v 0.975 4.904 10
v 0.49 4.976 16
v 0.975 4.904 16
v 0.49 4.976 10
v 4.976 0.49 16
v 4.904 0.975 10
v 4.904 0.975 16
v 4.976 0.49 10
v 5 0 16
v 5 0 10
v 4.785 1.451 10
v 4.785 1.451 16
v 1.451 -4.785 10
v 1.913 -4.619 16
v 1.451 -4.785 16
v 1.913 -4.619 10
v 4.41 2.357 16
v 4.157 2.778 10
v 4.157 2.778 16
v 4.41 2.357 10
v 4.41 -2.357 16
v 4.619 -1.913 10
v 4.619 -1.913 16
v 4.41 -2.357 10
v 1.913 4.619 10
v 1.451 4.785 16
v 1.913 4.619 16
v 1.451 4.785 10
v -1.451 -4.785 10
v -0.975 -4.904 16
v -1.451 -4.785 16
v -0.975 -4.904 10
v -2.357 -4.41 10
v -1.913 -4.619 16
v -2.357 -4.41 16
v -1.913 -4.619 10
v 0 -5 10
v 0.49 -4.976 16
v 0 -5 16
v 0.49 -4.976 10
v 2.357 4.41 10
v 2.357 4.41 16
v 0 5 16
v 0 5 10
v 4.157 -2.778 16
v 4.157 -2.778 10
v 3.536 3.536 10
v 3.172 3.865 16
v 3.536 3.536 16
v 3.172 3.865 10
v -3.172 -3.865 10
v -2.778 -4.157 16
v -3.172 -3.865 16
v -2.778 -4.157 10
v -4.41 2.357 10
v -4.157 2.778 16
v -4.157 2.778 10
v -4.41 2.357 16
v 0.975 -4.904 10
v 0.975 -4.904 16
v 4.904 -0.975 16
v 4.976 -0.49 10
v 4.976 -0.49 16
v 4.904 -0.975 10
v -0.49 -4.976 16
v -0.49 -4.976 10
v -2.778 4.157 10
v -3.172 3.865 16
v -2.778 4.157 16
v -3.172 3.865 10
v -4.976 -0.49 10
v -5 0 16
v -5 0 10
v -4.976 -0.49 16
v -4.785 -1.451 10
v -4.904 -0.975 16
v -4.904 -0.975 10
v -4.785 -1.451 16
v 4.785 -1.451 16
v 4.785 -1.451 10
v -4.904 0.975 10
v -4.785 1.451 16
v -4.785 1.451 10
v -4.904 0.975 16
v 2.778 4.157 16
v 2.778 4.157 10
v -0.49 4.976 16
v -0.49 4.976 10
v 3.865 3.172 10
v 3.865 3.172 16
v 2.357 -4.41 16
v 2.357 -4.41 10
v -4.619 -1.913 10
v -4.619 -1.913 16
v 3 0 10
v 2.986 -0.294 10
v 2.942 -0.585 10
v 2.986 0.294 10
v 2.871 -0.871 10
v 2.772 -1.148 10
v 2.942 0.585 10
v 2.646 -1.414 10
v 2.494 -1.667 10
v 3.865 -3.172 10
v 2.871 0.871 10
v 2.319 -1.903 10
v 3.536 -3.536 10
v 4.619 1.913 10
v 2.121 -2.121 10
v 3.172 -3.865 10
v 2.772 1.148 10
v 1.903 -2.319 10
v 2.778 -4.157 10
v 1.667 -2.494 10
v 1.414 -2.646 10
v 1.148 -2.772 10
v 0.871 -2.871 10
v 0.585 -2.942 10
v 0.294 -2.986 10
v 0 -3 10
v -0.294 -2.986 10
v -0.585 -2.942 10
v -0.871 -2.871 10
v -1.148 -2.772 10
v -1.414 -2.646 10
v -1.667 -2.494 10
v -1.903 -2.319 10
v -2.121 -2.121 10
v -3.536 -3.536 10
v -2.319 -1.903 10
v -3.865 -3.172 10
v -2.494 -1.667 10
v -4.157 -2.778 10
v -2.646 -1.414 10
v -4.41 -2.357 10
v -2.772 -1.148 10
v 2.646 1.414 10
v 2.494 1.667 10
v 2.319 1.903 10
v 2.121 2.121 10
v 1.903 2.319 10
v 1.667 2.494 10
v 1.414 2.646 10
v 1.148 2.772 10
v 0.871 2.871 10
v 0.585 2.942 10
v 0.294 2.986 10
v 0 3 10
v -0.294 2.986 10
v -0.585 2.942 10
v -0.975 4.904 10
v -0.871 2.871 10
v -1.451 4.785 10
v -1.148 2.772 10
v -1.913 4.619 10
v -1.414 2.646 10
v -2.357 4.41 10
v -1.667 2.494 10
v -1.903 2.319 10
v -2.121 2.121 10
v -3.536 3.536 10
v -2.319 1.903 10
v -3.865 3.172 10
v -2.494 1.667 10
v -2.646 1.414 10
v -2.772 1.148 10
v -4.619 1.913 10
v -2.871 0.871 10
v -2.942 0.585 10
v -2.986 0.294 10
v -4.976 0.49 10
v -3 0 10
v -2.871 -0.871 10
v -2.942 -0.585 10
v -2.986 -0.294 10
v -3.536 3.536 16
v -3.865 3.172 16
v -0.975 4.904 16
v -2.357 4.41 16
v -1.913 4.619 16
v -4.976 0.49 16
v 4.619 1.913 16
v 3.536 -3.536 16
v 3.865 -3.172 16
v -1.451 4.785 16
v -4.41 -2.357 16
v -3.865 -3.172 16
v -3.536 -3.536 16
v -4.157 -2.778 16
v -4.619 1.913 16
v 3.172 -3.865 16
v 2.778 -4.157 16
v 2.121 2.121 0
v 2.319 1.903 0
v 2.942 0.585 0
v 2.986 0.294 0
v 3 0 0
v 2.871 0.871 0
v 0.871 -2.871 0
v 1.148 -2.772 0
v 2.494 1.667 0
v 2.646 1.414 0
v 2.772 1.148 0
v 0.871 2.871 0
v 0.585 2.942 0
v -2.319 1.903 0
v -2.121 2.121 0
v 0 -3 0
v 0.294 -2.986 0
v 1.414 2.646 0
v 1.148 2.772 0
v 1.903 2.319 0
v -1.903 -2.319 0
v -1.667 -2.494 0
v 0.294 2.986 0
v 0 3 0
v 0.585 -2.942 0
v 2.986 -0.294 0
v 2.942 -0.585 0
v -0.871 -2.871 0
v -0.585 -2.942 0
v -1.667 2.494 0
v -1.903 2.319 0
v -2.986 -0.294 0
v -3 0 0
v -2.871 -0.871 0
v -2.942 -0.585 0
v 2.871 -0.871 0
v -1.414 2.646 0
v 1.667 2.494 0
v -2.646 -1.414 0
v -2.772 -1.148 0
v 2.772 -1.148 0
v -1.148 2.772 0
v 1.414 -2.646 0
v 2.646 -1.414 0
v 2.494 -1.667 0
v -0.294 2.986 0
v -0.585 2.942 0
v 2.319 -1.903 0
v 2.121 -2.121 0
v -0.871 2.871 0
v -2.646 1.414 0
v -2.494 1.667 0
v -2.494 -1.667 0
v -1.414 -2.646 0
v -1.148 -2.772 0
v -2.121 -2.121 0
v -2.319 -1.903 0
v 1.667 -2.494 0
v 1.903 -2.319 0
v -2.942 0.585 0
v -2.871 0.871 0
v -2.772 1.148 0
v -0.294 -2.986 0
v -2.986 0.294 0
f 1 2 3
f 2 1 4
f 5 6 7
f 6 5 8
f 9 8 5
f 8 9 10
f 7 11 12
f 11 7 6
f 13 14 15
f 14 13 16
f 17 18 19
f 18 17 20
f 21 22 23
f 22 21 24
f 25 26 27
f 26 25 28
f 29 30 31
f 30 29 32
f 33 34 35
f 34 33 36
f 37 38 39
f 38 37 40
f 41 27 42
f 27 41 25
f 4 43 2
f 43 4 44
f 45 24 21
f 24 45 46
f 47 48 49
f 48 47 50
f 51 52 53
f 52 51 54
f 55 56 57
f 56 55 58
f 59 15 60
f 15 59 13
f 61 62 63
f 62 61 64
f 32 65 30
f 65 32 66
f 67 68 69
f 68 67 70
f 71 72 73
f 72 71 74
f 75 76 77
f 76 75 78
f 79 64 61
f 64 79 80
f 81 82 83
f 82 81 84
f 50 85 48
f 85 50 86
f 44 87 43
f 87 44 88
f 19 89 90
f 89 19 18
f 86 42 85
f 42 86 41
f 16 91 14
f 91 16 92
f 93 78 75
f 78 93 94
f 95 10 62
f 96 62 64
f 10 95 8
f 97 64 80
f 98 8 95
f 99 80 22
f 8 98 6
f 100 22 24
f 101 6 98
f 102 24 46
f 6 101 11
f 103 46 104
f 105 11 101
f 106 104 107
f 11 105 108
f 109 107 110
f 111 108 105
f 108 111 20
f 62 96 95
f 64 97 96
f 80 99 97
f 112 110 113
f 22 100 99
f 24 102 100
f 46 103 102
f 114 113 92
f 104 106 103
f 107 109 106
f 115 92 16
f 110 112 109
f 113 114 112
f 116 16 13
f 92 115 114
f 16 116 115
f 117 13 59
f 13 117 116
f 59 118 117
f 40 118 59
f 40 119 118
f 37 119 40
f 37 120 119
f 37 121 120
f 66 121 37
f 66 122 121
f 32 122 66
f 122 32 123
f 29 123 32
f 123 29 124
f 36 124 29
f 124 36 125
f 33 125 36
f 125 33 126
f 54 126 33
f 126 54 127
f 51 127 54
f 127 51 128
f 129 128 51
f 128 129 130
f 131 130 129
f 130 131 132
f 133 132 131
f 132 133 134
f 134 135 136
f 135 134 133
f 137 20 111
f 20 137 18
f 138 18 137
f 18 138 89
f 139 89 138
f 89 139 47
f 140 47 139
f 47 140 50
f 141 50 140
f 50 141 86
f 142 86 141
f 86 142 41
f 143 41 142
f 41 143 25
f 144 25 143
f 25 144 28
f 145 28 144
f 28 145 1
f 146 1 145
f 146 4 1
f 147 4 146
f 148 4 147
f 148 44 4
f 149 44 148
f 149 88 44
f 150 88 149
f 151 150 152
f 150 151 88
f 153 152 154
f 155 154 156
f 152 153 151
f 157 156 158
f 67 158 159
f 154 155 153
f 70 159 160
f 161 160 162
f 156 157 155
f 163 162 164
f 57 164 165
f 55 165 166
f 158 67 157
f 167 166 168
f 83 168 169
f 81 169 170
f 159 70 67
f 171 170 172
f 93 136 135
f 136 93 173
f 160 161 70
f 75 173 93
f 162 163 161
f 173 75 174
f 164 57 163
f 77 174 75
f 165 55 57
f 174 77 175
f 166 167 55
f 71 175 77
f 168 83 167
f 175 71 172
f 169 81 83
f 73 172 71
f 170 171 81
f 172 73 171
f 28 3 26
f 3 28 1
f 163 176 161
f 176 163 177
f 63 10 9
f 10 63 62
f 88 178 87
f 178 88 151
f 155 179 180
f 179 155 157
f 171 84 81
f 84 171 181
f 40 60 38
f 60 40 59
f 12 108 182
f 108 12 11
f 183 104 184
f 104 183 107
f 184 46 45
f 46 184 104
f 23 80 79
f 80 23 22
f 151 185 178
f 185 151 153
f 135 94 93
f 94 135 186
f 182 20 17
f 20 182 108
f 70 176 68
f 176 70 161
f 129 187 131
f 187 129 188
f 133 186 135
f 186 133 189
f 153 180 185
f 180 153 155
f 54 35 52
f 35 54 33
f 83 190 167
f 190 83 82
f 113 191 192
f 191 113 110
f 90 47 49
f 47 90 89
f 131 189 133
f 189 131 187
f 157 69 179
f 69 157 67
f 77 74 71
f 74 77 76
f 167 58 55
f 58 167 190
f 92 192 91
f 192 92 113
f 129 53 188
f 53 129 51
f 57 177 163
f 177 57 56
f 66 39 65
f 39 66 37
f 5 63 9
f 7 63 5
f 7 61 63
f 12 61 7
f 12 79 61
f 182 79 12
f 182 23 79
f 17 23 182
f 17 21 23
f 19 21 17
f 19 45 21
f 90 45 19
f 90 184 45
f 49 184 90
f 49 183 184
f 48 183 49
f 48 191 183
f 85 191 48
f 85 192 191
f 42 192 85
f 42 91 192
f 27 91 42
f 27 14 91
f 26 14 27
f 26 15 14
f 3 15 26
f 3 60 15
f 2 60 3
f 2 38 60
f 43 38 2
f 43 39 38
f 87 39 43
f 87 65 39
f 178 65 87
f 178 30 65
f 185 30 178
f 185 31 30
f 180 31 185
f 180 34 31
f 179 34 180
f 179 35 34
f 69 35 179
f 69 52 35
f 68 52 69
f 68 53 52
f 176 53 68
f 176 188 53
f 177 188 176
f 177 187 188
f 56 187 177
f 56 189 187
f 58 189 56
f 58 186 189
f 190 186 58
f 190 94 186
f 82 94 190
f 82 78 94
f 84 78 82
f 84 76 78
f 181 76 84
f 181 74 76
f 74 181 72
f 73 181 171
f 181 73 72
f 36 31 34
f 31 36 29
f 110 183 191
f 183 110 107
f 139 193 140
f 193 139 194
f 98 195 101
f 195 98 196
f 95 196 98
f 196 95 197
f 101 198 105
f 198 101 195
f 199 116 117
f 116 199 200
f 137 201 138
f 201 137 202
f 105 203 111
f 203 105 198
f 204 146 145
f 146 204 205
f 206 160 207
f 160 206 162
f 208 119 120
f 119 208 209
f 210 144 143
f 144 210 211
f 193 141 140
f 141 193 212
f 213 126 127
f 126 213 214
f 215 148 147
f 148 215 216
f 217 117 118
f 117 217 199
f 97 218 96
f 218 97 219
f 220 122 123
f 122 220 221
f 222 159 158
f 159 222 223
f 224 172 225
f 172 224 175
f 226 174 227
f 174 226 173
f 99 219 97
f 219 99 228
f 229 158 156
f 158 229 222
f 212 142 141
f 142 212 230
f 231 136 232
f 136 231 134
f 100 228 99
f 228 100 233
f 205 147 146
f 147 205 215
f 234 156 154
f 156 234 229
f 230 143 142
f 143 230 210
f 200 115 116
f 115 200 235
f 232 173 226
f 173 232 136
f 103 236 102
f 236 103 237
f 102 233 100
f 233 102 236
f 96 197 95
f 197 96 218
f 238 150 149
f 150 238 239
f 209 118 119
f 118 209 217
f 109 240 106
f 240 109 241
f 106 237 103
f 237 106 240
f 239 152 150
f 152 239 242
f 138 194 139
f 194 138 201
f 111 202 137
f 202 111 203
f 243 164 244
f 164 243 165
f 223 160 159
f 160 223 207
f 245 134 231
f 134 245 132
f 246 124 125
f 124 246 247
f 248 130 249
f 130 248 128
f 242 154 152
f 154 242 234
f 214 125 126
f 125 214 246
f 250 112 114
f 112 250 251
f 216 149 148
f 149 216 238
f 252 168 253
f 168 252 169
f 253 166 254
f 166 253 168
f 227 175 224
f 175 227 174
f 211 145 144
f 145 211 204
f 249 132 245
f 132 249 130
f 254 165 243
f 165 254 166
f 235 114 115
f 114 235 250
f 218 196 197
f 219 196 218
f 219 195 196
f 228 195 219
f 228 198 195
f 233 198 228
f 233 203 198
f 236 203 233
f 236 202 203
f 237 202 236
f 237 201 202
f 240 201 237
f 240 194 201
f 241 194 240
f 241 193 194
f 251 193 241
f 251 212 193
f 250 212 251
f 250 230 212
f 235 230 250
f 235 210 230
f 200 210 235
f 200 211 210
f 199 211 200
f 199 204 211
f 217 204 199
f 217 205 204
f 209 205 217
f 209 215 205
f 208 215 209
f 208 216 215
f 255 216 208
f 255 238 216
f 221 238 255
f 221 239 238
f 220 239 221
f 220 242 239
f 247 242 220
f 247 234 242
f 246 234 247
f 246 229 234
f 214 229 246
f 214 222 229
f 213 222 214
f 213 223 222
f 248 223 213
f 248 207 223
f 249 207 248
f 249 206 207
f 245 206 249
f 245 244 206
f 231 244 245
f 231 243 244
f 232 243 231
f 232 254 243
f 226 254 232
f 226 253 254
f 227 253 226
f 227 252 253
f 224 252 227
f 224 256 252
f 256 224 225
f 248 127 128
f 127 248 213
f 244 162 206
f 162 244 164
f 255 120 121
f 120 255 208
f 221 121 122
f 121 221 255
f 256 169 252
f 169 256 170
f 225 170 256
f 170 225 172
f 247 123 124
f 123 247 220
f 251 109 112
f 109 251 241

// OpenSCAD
module socket_head_cap_screw() {
    union() {
        // Screw head
        translate([0, 0, 10])
            cylinder(h=6, d=10, $fn=64);
        
        // Screw shaft
        cylinder(h=10, d=6, $fn=64);
    }
}

socket_head_cap_screw();
